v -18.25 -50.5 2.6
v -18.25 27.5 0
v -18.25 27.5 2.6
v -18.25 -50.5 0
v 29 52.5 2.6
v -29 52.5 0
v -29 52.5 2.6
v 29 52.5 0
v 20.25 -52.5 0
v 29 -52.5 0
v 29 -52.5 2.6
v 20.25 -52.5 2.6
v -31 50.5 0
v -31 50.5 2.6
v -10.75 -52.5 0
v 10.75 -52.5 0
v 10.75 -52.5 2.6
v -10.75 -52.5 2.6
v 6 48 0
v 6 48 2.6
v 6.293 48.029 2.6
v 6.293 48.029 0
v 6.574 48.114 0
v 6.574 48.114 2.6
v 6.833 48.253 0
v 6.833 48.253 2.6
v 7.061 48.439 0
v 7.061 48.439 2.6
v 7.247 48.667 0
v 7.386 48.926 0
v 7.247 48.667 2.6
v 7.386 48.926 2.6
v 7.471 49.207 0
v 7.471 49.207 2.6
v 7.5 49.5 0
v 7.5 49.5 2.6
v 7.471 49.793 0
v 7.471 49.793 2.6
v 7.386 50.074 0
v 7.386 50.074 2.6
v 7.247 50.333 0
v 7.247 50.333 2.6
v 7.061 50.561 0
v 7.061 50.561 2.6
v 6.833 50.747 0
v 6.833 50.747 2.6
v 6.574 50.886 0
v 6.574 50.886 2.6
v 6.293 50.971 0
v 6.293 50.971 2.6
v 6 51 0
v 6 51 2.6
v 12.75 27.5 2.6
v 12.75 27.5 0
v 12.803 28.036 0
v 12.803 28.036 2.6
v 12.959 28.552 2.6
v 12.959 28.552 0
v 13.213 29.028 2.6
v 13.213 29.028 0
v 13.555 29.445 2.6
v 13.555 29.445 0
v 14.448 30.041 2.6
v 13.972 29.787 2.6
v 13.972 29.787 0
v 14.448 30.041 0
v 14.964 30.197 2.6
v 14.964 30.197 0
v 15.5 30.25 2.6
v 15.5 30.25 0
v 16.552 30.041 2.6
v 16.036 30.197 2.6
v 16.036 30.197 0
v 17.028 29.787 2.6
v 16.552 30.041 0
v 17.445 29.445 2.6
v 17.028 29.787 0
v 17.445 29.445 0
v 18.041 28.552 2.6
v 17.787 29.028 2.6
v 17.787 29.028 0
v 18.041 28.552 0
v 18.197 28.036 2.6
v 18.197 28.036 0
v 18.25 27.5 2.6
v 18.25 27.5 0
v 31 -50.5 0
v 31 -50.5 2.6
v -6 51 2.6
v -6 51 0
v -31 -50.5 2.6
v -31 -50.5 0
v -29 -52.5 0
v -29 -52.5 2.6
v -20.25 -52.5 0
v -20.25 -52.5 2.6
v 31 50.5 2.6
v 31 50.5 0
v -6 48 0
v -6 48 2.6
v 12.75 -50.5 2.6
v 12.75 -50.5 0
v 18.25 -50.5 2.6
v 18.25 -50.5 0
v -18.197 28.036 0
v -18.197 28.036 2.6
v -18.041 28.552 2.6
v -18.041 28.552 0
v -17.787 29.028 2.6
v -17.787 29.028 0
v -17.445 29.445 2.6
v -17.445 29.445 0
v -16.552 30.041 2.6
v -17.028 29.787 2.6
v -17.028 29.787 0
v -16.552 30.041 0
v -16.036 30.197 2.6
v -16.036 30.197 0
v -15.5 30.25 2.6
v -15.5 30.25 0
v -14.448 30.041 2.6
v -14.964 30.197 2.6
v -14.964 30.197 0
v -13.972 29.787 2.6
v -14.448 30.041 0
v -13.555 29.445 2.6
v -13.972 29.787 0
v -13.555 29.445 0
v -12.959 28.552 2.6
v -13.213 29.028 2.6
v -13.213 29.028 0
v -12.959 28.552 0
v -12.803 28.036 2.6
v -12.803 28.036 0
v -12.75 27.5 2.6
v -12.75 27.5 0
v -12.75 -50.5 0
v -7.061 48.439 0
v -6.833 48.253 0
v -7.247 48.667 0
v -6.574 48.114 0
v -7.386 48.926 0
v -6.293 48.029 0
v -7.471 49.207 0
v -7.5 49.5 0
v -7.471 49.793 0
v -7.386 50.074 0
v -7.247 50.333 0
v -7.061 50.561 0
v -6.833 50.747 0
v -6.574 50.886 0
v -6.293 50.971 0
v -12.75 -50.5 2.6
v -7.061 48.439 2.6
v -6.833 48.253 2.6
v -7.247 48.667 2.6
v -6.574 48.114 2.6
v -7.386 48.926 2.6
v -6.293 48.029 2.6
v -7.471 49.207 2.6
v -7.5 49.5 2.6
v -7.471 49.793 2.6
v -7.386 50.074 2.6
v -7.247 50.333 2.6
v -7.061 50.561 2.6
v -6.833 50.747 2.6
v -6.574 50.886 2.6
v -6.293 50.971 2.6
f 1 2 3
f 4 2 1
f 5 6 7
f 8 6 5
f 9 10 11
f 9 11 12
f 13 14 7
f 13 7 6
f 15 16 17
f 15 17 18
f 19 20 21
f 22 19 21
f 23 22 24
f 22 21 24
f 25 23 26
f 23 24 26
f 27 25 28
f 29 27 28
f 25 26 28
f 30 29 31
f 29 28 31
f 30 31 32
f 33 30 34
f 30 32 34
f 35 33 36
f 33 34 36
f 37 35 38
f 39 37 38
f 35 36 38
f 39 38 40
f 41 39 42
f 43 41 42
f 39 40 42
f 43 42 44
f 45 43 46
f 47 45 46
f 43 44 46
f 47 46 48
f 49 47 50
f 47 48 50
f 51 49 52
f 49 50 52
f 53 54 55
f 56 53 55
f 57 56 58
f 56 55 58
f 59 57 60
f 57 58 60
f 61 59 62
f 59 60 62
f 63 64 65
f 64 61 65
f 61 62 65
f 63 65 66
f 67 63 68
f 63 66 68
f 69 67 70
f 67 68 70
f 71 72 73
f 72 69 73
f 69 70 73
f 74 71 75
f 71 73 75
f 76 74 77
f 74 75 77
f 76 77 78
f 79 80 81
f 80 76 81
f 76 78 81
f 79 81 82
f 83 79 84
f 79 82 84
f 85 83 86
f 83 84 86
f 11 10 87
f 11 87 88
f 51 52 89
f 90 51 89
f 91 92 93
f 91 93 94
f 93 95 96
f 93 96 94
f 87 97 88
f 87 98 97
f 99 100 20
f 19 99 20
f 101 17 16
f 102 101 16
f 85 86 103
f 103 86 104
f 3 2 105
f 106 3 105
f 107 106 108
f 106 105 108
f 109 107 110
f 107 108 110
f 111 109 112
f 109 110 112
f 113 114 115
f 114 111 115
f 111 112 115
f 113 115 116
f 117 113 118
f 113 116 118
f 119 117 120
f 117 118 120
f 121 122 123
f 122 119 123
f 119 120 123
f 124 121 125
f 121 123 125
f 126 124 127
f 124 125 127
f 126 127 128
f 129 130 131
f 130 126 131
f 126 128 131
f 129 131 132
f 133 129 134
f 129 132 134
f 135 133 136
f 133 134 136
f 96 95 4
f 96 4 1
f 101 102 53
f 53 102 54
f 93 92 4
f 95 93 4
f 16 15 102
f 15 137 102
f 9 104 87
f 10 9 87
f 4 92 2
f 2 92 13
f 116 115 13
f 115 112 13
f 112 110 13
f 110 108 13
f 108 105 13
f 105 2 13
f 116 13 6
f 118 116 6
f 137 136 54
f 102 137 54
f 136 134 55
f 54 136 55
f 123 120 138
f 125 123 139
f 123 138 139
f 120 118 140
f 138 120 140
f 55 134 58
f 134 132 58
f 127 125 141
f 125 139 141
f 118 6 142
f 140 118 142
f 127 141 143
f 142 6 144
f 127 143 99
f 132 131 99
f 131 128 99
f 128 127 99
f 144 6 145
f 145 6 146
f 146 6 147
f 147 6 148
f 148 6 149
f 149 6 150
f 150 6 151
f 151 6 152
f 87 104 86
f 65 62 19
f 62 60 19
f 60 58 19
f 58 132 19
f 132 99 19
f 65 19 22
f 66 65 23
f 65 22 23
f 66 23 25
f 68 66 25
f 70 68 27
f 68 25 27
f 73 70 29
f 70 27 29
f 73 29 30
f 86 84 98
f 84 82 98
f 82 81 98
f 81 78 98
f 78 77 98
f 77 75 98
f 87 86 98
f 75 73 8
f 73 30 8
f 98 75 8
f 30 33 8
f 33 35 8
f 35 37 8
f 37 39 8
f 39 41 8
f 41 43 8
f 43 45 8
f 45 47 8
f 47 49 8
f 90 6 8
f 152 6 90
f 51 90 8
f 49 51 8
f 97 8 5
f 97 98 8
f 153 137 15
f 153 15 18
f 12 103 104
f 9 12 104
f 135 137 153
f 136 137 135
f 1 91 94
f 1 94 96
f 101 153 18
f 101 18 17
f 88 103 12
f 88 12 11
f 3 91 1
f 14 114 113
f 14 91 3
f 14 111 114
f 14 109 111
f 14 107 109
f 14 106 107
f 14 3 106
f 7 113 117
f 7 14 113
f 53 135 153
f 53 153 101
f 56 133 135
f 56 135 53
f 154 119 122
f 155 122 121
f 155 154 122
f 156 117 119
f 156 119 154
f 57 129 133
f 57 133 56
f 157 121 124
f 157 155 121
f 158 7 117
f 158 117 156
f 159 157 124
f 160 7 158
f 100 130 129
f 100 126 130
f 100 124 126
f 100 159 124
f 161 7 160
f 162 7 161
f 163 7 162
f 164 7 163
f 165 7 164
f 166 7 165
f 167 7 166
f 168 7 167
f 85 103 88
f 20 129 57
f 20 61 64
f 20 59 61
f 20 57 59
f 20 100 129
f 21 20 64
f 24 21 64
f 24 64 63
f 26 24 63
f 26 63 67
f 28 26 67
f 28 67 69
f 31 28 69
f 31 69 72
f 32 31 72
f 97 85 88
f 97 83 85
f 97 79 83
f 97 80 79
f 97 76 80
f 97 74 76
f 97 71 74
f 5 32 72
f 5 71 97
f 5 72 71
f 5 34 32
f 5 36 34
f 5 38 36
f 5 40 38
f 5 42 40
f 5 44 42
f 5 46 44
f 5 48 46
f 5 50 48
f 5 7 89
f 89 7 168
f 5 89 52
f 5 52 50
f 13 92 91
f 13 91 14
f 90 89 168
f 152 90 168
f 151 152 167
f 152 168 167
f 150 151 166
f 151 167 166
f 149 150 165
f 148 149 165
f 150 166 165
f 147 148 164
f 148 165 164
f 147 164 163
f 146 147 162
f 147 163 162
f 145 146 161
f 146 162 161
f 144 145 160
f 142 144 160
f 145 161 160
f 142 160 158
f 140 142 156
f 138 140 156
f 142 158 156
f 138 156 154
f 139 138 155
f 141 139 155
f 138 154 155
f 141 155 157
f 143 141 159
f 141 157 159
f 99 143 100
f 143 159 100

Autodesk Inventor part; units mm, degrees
ref_plane "YZ Plane" through (0, 0, 0) normal (1, 0, 0) x (0, 1, 0)
ref_plane "XZ Plane" through (0, 0, 0) normal (0, 1, 0) x (-1, 0, 0)
ref_plane "XY Plane" through (0, 0, 0) normal (0, 0, 1) x (1, 0, 0)
sketch "Sketch5" plane through (0, 0, 0) normal (0, 0, 1) x (1, 0, 0)
  line L0 (-31, 52.5) -> (31, 52.5)
  line L1 (31, 52.5) -> (31, -52.5)
  line L2 (-31, -52.5) -> (-31, 52.5)
  line L3 (-15.5, 27.5) -> (-15.5, -52.5) construction
  line L4 (-18.25, 27.5) -> (-18.25, -52.5)
  line L5 (-12.75, -52.5) -> (-12.75, 27.5)
  arc A0 (-12.75, 27.5) -> (-18.25, 27.5) centre (-15.5, 27.5) ccw
  arc A1 (-18.25, -52.5) -> (-12.75, -52.5) centre (-15.5, -52.5) ccw
  line L6 (0, 0) -> (0, 14.7878) construction
  line L7 (15.5, 27.5) -> (15.5, -52.5) construction
  line L8 (18.25, 27.5) -> (18.25, -52.5)
  line L9 (12.75, -52.5) -> (12.75, 27.5)
  arc A2 (18.25, 27.5) -> (12.75, 27.5) centre (15.5, 27.5) ccw
  arc A3 (12.75, -52.5) -> (18.25, -52.5) centre (15.5, -52.5) ccw
  line L10 (-18.25, -52.5) -> (-31, -52.5)
  line L11 (31, -52.5) -> (18.25, -52.5)
  line L12 (12.75, -52.5) -> (-12.75, -52.5)
  point P0 (0, 52.5)
  point P1 (-31, 0)
  point P2 (-15.5, -12.5)
  dimension "d8" = 62
  dimension "d9" = 105
  dimension "d10" = 15.5
  dimension "d11" = 5.5
  dimension "d12" = 80
extrude "Extrusion5" add sketch "Sketch5" along normal blind 2.6 contours L0 L1 L11 L8 A2 L9 L12 L5 A0 L4 L10 L2
chamfer "Chamfer1" distance 2 angle 45 8 edges at (-18.25, -52.5, 1.3) (-12.75, -52.5, 1.3) (12.75, -52.5, 1.3) (18.25, -52.5, 1.3) (31, -52.5, 1.3) (-31, -52.5, 1.3) (31, 52.5, 1.3) (-31, 52.5, 1.3)
sketch "Sketch6" plane through (0, 0, 2.6) normal (0, 0, 1) x (1, 0, 0)
  line L0 (29, 52.5) -> (-29, 52.5) projected
  line L1 (6, 49.5) -> (-6, 49.5) construction
  line L2 (6, 51) -> (-6, 51)
  line L3 (-6, 48) -> (6, 48)
  arc A0 (6, 48) -> (6, 51) centre (6, 49.5) ccw
  arc A1 (-6, 51) -> (-6, 48) centre (-6, 49.5) ccw
  point P0 (0, 0)
  point P1 (0, 49.5)
  dimension "d18" = 12
  dimension "d19" = 3
  dimension "d20" = 1.5
extrude "Extrusion6" cut sketch "Sketch6" against normal through all
properties part number "BC-10027" material "Aço Inox AISI 316"
